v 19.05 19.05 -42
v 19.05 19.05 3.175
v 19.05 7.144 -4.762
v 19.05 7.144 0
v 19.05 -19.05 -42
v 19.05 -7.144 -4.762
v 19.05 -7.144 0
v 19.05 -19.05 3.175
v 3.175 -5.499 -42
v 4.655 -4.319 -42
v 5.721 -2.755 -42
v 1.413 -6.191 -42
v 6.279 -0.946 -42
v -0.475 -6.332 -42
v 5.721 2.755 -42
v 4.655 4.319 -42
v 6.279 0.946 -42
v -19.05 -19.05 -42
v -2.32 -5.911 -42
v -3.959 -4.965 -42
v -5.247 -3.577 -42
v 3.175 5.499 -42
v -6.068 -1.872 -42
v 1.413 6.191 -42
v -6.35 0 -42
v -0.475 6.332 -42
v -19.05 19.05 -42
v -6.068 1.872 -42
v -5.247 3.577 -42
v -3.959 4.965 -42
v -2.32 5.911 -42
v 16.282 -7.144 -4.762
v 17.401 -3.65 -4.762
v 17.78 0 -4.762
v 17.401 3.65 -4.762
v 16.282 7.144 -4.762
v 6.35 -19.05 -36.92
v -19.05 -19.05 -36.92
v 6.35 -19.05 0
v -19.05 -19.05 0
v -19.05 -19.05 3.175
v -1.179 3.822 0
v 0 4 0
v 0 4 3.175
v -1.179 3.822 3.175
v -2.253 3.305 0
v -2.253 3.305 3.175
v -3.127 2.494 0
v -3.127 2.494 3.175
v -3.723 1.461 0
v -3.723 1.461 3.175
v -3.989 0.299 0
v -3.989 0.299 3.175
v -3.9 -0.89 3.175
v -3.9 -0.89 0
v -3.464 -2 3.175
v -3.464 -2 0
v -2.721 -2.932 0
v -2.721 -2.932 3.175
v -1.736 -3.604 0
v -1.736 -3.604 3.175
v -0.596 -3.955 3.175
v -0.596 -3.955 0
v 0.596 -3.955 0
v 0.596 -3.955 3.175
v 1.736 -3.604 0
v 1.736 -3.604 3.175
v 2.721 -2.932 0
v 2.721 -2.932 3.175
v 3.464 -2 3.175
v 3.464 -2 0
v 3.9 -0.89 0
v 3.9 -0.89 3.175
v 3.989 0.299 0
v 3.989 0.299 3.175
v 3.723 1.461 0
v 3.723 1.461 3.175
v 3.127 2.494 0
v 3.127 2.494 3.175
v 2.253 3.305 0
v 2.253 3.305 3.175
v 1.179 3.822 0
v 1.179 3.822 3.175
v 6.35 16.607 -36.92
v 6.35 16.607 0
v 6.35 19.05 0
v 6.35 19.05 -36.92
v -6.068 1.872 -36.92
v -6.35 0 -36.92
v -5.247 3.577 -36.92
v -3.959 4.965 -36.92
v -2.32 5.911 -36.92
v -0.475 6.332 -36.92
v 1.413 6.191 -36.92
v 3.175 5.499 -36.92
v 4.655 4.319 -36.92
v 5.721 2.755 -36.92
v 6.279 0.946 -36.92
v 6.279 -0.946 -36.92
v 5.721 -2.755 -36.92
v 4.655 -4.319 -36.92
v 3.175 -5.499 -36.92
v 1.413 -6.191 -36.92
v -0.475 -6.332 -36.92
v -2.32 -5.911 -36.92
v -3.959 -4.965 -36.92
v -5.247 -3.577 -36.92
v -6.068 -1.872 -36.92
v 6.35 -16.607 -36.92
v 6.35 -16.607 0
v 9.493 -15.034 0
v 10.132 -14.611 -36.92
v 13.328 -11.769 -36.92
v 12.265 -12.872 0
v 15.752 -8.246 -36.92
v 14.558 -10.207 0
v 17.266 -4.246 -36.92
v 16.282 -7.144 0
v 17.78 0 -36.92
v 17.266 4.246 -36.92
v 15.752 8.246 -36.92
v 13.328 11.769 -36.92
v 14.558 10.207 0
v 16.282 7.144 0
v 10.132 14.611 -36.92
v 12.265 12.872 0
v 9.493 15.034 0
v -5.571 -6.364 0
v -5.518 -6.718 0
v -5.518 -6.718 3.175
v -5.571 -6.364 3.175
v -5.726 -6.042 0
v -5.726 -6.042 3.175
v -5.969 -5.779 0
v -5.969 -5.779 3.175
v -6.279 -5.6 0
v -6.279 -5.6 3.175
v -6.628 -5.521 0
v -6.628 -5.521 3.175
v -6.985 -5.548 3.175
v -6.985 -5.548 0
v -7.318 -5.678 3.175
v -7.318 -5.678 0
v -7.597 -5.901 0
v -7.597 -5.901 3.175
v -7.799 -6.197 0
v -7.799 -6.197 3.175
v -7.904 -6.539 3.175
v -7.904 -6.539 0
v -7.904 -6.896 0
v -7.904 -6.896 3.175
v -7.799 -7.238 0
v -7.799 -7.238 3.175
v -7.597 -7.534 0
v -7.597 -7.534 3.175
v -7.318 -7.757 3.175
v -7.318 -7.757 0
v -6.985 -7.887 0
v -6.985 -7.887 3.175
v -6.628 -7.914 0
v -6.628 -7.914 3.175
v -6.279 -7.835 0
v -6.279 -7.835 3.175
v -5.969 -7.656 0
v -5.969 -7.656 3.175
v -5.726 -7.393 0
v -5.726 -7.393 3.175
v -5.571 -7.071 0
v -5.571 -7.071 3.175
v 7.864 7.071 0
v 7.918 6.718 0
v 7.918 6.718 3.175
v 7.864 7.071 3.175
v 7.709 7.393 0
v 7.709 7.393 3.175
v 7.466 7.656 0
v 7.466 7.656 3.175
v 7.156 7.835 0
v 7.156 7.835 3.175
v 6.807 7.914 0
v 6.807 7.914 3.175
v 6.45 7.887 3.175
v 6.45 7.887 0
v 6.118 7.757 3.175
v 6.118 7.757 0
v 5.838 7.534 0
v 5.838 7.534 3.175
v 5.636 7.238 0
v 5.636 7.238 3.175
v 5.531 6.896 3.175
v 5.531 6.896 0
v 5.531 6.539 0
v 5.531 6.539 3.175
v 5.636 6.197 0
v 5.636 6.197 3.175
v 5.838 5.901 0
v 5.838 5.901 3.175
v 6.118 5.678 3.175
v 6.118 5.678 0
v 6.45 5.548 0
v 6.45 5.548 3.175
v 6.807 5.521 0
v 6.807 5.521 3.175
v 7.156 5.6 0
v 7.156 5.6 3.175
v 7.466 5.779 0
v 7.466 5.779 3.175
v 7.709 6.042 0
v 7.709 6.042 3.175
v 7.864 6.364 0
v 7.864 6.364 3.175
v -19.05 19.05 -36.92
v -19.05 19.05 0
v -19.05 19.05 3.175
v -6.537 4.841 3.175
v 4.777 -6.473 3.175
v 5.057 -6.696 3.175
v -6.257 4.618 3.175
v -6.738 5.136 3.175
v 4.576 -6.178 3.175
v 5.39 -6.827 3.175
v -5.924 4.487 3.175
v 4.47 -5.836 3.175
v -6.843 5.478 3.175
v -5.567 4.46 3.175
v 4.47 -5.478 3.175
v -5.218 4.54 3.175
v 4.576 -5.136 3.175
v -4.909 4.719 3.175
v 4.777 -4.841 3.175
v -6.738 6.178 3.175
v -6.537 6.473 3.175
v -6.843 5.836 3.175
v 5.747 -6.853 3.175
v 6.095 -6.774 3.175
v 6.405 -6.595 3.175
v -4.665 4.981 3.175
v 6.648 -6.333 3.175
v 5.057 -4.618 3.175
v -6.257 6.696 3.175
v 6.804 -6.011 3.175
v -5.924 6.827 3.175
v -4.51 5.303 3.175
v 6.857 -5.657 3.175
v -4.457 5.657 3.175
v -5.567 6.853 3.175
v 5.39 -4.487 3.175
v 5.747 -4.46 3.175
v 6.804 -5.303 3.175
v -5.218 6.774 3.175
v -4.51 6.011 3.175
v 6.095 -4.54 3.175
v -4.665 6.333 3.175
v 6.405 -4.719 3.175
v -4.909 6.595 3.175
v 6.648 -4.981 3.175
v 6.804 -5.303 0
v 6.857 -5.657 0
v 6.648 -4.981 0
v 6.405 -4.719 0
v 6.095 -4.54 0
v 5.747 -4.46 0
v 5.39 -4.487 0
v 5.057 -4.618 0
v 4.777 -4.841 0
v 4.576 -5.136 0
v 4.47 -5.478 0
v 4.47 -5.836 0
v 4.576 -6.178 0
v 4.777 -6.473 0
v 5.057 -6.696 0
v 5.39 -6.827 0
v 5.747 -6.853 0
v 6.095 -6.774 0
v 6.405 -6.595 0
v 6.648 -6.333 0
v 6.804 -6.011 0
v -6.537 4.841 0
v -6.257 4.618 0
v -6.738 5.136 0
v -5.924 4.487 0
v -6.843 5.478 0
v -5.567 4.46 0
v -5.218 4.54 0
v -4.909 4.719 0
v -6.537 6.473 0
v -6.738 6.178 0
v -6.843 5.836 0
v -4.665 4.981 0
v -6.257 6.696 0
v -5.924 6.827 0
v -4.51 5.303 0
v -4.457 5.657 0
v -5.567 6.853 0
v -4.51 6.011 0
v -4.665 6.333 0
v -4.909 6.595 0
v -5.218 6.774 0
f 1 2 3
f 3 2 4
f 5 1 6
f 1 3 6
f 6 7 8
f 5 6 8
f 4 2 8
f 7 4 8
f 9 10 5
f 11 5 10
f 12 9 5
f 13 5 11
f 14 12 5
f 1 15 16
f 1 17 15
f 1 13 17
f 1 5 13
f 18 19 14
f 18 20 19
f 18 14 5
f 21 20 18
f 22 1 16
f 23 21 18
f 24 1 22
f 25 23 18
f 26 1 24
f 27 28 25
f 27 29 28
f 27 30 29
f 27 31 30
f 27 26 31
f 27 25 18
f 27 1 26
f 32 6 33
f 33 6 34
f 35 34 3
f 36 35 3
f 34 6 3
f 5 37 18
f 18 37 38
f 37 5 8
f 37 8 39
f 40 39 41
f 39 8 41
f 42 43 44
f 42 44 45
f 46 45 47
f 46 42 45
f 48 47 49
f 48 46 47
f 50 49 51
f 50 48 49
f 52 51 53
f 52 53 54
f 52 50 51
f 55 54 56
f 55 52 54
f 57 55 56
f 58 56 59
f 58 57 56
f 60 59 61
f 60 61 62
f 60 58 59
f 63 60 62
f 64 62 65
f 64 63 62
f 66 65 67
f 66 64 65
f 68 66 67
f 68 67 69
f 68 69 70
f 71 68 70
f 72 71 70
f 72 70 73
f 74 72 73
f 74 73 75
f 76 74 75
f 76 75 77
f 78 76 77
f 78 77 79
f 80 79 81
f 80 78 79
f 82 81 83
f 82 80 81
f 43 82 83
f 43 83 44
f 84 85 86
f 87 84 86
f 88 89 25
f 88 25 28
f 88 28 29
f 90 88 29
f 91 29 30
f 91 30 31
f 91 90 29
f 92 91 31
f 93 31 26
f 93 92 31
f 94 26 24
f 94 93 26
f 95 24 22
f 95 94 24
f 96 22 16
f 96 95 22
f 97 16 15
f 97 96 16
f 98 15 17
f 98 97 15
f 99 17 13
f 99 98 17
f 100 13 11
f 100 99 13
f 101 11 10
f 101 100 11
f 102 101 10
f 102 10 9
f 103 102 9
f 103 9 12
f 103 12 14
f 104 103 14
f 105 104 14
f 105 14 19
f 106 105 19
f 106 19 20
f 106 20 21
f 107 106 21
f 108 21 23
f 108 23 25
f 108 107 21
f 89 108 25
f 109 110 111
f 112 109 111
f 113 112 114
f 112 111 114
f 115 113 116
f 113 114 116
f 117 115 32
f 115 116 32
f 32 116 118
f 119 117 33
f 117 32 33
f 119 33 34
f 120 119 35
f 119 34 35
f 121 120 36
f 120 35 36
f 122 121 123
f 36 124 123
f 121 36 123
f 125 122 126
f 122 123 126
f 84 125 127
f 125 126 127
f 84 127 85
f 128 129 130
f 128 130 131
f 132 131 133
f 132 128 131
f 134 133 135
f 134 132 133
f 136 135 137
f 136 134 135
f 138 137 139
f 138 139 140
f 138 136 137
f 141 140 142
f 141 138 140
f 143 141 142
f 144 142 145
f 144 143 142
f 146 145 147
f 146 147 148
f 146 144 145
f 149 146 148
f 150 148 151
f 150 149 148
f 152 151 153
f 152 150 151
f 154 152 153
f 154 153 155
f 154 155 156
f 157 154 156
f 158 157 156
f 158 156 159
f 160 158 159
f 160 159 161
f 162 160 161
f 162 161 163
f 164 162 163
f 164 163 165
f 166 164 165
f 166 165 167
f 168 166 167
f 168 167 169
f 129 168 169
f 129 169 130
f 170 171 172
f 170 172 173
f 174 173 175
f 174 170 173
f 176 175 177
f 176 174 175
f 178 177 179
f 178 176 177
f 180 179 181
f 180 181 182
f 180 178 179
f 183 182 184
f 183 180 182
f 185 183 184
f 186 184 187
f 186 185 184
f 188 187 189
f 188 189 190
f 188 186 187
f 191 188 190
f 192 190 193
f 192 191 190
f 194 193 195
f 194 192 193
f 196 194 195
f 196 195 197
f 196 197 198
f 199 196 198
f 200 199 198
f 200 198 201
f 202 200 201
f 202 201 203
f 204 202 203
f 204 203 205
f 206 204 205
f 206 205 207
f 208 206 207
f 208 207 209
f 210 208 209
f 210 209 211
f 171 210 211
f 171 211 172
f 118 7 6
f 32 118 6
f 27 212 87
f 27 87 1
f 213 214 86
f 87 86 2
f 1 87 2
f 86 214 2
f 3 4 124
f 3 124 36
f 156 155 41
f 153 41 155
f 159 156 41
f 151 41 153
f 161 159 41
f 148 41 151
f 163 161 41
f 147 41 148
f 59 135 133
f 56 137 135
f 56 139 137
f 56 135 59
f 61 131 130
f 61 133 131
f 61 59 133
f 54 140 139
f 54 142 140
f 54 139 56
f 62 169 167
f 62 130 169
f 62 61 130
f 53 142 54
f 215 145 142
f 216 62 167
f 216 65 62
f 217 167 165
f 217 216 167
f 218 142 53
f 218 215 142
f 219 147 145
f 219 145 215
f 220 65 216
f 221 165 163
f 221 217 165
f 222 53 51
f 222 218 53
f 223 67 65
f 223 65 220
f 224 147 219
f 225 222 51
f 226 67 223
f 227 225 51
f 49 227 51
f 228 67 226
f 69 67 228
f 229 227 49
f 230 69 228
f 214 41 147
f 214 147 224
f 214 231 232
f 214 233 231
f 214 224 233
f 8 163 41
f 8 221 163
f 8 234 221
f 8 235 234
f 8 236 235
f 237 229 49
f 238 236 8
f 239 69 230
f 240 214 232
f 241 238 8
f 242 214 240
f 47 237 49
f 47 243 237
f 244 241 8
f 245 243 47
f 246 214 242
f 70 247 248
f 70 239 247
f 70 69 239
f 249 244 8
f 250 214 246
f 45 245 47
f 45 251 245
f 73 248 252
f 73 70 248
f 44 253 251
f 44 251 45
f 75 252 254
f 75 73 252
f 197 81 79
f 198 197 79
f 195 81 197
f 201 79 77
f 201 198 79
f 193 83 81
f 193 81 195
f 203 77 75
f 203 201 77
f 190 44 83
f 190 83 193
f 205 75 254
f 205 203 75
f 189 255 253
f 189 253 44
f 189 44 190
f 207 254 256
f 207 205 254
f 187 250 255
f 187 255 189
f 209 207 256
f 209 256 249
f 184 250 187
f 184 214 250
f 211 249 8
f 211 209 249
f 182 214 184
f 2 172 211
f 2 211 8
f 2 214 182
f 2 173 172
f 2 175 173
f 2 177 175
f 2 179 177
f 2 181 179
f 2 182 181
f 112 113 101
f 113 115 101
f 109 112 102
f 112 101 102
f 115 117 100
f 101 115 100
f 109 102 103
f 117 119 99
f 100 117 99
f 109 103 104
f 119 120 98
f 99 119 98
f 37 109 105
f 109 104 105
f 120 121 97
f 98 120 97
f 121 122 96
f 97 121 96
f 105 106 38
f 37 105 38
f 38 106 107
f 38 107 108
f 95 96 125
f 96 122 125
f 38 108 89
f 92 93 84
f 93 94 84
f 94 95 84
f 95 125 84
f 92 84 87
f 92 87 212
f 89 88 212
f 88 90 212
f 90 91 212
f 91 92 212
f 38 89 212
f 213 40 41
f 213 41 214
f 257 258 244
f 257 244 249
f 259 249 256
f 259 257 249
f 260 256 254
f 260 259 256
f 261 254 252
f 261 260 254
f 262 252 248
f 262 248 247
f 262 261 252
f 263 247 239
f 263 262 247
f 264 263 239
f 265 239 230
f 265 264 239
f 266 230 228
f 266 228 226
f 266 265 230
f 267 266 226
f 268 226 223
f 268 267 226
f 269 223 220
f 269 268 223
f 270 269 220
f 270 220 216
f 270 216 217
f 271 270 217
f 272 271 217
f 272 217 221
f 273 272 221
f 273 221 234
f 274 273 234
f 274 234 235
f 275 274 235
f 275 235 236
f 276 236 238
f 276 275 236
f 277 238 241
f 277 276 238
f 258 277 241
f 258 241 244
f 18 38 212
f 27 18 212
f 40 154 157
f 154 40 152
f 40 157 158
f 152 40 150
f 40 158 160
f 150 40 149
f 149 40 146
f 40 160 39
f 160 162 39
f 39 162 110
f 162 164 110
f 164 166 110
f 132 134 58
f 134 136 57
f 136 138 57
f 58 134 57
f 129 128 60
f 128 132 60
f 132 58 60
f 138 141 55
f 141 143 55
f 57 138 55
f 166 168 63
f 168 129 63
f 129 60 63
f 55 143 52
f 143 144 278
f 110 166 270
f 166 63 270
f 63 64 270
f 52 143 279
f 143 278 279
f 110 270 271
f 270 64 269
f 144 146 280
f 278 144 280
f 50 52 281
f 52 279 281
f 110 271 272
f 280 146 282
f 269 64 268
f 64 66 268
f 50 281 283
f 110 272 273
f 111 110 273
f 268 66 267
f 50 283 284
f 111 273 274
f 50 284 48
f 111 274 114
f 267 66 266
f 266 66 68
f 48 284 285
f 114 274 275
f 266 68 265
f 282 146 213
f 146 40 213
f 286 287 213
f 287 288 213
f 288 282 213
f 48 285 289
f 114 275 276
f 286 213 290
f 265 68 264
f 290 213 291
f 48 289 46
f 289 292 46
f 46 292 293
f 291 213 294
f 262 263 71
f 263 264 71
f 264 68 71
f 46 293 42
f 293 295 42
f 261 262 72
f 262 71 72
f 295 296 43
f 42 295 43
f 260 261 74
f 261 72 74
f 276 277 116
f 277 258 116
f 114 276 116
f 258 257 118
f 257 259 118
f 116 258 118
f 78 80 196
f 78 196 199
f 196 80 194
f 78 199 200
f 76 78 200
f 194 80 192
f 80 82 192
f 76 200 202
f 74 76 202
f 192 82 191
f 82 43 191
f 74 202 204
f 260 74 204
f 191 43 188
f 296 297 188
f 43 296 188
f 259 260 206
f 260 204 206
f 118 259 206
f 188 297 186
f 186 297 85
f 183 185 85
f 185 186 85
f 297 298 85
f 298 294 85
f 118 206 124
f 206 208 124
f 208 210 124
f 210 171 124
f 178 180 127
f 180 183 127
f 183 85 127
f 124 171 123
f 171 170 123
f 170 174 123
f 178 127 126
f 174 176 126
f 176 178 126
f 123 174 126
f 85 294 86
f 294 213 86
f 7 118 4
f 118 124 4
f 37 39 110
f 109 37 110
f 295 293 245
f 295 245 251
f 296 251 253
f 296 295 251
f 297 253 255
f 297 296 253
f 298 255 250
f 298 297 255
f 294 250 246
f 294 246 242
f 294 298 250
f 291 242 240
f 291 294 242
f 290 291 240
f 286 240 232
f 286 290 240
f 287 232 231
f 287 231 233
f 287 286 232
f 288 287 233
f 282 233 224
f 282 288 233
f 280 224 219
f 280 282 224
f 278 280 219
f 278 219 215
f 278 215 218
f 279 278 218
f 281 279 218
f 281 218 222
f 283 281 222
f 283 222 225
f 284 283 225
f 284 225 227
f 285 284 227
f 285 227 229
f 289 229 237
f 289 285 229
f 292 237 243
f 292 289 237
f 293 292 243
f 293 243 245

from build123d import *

# Parameters (mm, degrees)
SKETCH2_W           = 38.1
SKETCH2_H           = 38.1
BOSS_EXTRUDE1_DEPTH = 3.175
BOSS_EXTRUDE2_DEPTH = 36.92
SKETCH5_R           = 6.35
BOSS_EXTRUDE3_DEPTH = 5.08
SKETCH8_W           = 4.7625
SKETCH8_H           = 14.2875
CUT_EXTRUDE1_DEPTH  = 60.820669505


with BuildPart() as part:
    # Sketch2 → Boss-Extrude1 (new body)
    with BuildSketch(Plane.XY):
        Rectangle(SKETCH2_W, SKETCH2_H)
        with BuildLine():
            ThreePointArc((5.517514421, 6.717514421), (6.717514421, 5.517514421), (7.917514421, 6.717514421))
            ThreePointArc((7.917514421, 6.717514421), (6.717514421, 7.917514421), (5.517514421, 6.717514421))
        make_face(mode=Mode.SUBTRACT)
        with BuildLine():
            ThreePointArc((4.456854249, -5.656854249), (5.656854249, -6.856854249), (6.856854249, -5.656854249))
            ThreePointArc((6.856854249, -5.656854249), (5.656854249, -4.456854249), (4.456854249, -5.656854249))
        make_face(mode=Mode.SUBTRACT)
        with BuildLine():
            ThreePointArc((-7.917514421, -6.717514421), (-6.717514421, -7.917514421), (-5.517514421, -6.717514421))
            ThreePointArc((-5.517514421, -6.717514421), (-6.717514421, -5.517514421), (-7.917514421, -6.717514421))
        make_face(mode=Mode.SUBTRACT)
        with BuildLine():
            ThreePointArc((-6.856854249, 5.656854249), (-5.656854249, 4.456854249), (-4.456854249, 5.656854249))
            ThreePointArc((-4.456854249, 5.656854249), (-5.656854249, 6.856854249), (-6.856854249, 5.656854249))
        make_face(mode=Mode.SUBTRACT)
        with BuildLine():
            ThreePointArc((0, -4), (4, 0), (0, 4))
            ThreePointArc((0, 4), (-4, 0), (0, -4))
        make_face(mode=Mode.SUBTRACT)
    extrude(amount=BOSS_EXTRUDE1_DEPTH)

    # Sketch3 → Boss-Extrude2 (add)
    with BuildSketch(Plane(origin=(0, 0, 0), x_dir=(-1, 0, 0), z_dir=(0, 0, -1))):
        with BuildLine():
            Line((-19.05, -19.05), (-6.35, -19.05))
            Line((-6.35, -19.05), (-6.35, -16.607404975))
            ThreePointArc((-6.35, -16.607404975), (-17.78, 0), (-6.35, 16.607404975))
            Line((-6.35, 16.607404975), (-6.35, 19.05))
            Line((-6.35, 19.05), (-19.05, 19.05))
            Line((-19.05, 19.05), (-19.05, -19.05))
        make_face()
    extrude(amount=BOSS_EXTRUDE2_DEPTH)

    # Sketch5 → Boss-Extrude3 (add)
    # profile 1 of 3: a face of its own
    with BuildSketch(Plane(origin=(0, 0, -36.92), x_dir=(-1, 0, 0), z_dir=(0, 0, -1))):
        with BuildLine():
            Line((-6.35, -19.05), (19.05, -19.05))
            Line((19.05, -19.05), (19.05, 19.05))
            Line((19.05, 19.05), (-6.35, 19.05))
            Line((-6.35, 19.05), (-6.35, 16.607404975))
            ThreePointArc((-6.35, 16.607404975), (-17.78, 0), (-6.35, -16.607404975))
            Line((-6.35, -16.607404975), (-6.35, -19.05))
        make_face()
        with BuildLine():
            ThreePointArc((-14, 0), (0, 14), (14, 0))
            ThreePointArc((14, 0), (0, -14), (-14, 0))
        make_face(mode=Mode.SUBTRACT)
    # profile 2 of 3: a face of its own
    with BuildSketch(Plane(origin=(0, 0, -36.92), x_dir=(-1, 0, 0), z_dir=(0, 0, -1))):
        with BuildLine():
            ThreePointArc((14, 0), (0, 14), (-14, 0))
            ThreePointArc((-14, 0), (0, -14), (14, 0))
        make_face()
        Circle(SKETCH5_R, mode=Mode.SUBTRACT)
    # profile 3 of 3: a face of its own
    with BuildSketch(Plane(origin=(0, 0, -36.92), x_dir=(-1, 0, 0), z_dir=(0, 0, -1))):
        with BuildLine():
            Line((-6.35, -19.05), (-6.35, -16.607404975))
            ThreePointArc((-6.35, -16.607404975), (-17.78, 0), (-6.35, 16.607404975))
            Line((-6.35, 16.607404975), (-6.35, 19.05))
            Line((-6.35, 19.05), (-19.05, 19.05))
            Line((-19.05, 19.05), (-19.05, -19.05))
            Line((-19.05, -19.05), (-6.35, -19.05))
        make_face()
    extrude(amount=BOSS_EXTRUDE3_DEPTH)

    # Sketch8 → Cut-Extrude1 (cut, through all)
    with BuildSketch(Plane(origin=(19.05, 0, 0), x_dir=(0, 0, -1), z_dir=(1, 0, 0))):
        with Locations((2.38125, 0)):
            Rectangle(SKETCH8_W, SKETCH8_H)
    extrude(amount=-CUT_EXTRUDE1_DEPTH, mode=Mode.SUBTRACT)


solid = part.part
